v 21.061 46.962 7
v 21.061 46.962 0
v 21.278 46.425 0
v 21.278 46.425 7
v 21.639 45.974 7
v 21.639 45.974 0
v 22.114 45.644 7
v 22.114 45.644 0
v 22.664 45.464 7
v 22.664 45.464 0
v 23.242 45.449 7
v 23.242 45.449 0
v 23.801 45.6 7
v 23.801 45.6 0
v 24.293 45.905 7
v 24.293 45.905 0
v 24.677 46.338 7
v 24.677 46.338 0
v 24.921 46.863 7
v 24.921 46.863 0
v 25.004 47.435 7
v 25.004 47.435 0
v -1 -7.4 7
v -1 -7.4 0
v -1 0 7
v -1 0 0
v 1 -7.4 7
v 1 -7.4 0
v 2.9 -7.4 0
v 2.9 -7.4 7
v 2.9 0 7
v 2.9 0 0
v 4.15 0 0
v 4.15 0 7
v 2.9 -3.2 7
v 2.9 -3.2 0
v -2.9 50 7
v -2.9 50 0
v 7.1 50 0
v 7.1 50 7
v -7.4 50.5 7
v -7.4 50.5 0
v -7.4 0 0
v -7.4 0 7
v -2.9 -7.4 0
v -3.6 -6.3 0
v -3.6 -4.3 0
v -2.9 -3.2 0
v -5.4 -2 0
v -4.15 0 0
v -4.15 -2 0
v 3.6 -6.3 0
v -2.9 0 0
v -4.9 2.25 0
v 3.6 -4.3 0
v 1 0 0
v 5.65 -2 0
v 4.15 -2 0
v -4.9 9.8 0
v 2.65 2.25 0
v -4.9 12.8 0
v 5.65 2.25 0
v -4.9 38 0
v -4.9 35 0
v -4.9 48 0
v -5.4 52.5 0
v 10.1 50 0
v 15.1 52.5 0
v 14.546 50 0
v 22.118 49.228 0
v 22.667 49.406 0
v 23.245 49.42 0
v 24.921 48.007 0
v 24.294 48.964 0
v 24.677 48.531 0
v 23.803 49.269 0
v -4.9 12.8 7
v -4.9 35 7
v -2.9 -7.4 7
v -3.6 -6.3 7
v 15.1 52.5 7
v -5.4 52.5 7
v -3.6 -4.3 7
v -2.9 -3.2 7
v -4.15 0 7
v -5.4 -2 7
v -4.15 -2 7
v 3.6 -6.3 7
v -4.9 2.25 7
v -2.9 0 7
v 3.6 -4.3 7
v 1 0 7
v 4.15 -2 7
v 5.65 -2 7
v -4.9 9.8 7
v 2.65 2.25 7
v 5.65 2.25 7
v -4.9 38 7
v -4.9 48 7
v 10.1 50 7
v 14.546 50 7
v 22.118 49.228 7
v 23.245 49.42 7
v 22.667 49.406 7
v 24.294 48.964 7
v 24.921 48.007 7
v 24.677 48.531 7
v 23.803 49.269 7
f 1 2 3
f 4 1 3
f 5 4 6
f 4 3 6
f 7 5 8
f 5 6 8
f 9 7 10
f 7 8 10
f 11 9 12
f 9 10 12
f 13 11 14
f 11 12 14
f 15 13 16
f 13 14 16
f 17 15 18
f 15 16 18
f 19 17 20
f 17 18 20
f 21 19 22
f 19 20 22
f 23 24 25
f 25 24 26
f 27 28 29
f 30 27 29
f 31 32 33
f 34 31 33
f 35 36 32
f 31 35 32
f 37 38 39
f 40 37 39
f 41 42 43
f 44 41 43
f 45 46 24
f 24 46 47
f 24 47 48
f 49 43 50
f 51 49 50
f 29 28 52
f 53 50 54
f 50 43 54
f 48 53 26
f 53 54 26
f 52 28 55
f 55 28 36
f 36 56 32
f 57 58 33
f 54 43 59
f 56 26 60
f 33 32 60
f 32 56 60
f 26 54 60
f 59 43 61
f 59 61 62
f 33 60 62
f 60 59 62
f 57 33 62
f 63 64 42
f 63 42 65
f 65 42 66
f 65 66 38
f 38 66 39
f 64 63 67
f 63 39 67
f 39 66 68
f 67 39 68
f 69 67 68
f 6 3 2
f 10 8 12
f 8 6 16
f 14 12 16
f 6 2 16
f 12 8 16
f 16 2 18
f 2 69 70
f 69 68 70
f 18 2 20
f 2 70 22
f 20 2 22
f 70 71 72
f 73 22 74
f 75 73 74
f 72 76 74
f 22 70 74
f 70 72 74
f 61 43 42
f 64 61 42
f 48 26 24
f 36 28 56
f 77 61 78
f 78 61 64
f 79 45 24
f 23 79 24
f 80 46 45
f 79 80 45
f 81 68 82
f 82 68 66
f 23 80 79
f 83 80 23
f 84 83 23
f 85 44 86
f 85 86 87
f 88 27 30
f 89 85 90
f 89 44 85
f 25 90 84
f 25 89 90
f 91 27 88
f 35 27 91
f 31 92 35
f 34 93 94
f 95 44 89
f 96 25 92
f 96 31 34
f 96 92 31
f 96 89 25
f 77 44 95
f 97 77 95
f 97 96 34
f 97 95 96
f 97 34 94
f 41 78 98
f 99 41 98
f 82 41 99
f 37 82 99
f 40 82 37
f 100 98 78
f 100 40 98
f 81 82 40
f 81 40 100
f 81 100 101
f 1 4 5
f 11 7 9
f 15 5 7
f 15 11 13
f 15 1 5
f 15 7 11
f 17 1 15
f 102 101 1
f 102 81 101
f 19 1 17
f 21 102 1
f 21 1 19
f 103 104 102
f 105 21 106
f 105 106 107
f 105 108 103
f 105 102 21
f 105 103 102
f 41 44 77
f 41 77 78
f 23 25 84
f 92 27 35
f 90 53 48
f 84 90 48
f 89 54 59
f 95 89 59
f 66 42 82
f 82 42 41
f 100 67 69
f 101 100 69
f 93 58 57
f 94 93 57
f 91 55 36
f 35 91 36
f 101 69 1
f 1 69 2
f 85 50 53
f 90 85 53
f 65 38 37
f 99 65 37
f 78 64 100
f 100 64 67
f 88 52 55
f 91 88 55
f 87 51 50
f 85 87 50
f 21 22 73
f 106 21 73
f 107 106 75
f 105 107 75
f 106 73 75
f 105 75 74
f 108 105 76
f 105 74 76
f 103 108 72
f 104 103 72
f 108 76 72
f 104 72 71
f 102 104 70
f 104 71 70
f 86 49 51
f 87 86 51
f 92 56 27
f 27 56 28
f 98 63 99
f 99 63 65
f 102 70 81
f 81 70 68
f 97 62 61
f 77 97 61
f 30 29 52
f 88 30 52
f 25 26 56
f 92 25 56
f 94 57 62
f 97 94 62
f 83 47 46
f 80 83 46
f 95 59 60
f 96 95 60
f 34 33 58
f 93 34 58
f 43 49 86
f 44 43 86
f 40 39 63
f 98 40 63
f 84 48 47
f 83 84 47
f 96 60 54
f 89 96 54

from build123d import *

# Parameters (mm, degrees)
F1_DEPTH = 7
F2_SIZE  = 2


with BuildPart() as f1:
    # F0 (on Top) → F1 (new body)
    with BuildSketch(Plane.XY):
        Polygon((-1, -7.4), (-1, 0), (-2.9, 0), (-2.9, -3.2000038773), (-2.9, -7.4), align=None)
        with BuildLine():
            Line((-2.9, 0), (-1, 0))
            Line((-1, 0), (1, 0))
            Line((1, 0), (2.9, 0))
            Line((2.9, 0), (4.15, 0))
            Line((4.15, 0), (4.15, -2))
            Line((4.15, -2), (5.65, -2))
            Line((5.65, -2), (5.65, 2.25))
            Line((5.65, 2.25), (-4.9, 12.8))
            Line((-4.9, 12.8), (-4.9, 35))
            Line((-4.9, 35), (-4.9, 38))
            Line((-4.9, 38), (-4.9, 50))
            Line((-4.9, 50), (7.1, 50))
            Line((7.1, 50), (10.1, 50))
            Line((10.1, 50), (14.5457633434, 50))
            Line((14.5457633434, 50), (21.060983901, 46.9619027594))
            ThreePointArc((21.060983901, 46.9619027594), (21.1916137331, 48.280211467), (22.1175295553, 49.227672227))
            Line((22.1175295553, 49.227672227), (15.1, 52.5))
            Line((15.1, 52.5), (-7.4, 52.5))
            Line((-7.4, 52.5), (-7.4, -2))
            Line((-7.4, -2), (-4.15, -2))
            Line((-4.15, -2), (-4.15, 0))
            Line((-4.15, 0), (-2.9, 0))
        make_face()
        Polygon((-4.9, 9.8), (2.65, 2.25), (-4.9, 2.25), align=None, mode=Mode.SUBTRACT)
        Polygon((2.9, 0), (1, 0), (1, -7.4), (2.9, -7.4), (2.9, -3.2000038773), align=None)
        Polygon((-2.9, -7.4), (-2.9, -3.2000038773), (-3.6, -4.3000019386), (-3.6, -6.3000019386), align=None)
        Polygon((3.6, -4.3000019386), (2.9, -3.2000038773), (2.9, -7.4), (3.6, -6.3000019386), align=None)
        with BuildLine():
            ThreePointArc((25.0042293071, 47.4349749436), (24.0593597485, 49.1340040051), (22.1175295553, 49.227672227))
            Line((22.1175295553, 49.227672227), (23.5325021343, 48.5678596774))
            Line((23.5325021343, 48.5678596774), (22.47595648, 46.3020902098))
            Line((22.47595648, 46.3020902098), (21.060983901, 46.9619027594))
            ThreePointArc((21.060983901, 46.9619027594), (23.2424615338, 45.4492142817), (25.0042293071, 47.4349749436))
        make_face()
        with BuildLine():
            Line((23.5325021343, 48.5678596774), (22.1175295553, 49.227672227))
            ThreePointArc((22.1175295553, 49.227672227), (21.1916137331, 48.280211467), (21.060983901, 46.9619027594))
            Line((21.060983901, 46.9619027594), (22.47595648, 46.3020902098))
            Line((22.47595648, 46.3020902098), (23.5325021343, 48.5678596774))
        make_face()
        Polygon((-4.9, 38), (-4.9, 35), (10.1, 50), (7.1, 50), align=None)
    extrude(amount=F1_DEPTH)

    # F2
    f2_edges = [f1.edges().sort_by_distance(p)[0] for p in [
        (-4.9, 50, 3.5),
        (-7.4, 52.5, 3.5),
        (-7.4, -2, 3.5),
    ]]
    chamfer(f2_edges, length=F2_SIZE)


solid = f1.part
